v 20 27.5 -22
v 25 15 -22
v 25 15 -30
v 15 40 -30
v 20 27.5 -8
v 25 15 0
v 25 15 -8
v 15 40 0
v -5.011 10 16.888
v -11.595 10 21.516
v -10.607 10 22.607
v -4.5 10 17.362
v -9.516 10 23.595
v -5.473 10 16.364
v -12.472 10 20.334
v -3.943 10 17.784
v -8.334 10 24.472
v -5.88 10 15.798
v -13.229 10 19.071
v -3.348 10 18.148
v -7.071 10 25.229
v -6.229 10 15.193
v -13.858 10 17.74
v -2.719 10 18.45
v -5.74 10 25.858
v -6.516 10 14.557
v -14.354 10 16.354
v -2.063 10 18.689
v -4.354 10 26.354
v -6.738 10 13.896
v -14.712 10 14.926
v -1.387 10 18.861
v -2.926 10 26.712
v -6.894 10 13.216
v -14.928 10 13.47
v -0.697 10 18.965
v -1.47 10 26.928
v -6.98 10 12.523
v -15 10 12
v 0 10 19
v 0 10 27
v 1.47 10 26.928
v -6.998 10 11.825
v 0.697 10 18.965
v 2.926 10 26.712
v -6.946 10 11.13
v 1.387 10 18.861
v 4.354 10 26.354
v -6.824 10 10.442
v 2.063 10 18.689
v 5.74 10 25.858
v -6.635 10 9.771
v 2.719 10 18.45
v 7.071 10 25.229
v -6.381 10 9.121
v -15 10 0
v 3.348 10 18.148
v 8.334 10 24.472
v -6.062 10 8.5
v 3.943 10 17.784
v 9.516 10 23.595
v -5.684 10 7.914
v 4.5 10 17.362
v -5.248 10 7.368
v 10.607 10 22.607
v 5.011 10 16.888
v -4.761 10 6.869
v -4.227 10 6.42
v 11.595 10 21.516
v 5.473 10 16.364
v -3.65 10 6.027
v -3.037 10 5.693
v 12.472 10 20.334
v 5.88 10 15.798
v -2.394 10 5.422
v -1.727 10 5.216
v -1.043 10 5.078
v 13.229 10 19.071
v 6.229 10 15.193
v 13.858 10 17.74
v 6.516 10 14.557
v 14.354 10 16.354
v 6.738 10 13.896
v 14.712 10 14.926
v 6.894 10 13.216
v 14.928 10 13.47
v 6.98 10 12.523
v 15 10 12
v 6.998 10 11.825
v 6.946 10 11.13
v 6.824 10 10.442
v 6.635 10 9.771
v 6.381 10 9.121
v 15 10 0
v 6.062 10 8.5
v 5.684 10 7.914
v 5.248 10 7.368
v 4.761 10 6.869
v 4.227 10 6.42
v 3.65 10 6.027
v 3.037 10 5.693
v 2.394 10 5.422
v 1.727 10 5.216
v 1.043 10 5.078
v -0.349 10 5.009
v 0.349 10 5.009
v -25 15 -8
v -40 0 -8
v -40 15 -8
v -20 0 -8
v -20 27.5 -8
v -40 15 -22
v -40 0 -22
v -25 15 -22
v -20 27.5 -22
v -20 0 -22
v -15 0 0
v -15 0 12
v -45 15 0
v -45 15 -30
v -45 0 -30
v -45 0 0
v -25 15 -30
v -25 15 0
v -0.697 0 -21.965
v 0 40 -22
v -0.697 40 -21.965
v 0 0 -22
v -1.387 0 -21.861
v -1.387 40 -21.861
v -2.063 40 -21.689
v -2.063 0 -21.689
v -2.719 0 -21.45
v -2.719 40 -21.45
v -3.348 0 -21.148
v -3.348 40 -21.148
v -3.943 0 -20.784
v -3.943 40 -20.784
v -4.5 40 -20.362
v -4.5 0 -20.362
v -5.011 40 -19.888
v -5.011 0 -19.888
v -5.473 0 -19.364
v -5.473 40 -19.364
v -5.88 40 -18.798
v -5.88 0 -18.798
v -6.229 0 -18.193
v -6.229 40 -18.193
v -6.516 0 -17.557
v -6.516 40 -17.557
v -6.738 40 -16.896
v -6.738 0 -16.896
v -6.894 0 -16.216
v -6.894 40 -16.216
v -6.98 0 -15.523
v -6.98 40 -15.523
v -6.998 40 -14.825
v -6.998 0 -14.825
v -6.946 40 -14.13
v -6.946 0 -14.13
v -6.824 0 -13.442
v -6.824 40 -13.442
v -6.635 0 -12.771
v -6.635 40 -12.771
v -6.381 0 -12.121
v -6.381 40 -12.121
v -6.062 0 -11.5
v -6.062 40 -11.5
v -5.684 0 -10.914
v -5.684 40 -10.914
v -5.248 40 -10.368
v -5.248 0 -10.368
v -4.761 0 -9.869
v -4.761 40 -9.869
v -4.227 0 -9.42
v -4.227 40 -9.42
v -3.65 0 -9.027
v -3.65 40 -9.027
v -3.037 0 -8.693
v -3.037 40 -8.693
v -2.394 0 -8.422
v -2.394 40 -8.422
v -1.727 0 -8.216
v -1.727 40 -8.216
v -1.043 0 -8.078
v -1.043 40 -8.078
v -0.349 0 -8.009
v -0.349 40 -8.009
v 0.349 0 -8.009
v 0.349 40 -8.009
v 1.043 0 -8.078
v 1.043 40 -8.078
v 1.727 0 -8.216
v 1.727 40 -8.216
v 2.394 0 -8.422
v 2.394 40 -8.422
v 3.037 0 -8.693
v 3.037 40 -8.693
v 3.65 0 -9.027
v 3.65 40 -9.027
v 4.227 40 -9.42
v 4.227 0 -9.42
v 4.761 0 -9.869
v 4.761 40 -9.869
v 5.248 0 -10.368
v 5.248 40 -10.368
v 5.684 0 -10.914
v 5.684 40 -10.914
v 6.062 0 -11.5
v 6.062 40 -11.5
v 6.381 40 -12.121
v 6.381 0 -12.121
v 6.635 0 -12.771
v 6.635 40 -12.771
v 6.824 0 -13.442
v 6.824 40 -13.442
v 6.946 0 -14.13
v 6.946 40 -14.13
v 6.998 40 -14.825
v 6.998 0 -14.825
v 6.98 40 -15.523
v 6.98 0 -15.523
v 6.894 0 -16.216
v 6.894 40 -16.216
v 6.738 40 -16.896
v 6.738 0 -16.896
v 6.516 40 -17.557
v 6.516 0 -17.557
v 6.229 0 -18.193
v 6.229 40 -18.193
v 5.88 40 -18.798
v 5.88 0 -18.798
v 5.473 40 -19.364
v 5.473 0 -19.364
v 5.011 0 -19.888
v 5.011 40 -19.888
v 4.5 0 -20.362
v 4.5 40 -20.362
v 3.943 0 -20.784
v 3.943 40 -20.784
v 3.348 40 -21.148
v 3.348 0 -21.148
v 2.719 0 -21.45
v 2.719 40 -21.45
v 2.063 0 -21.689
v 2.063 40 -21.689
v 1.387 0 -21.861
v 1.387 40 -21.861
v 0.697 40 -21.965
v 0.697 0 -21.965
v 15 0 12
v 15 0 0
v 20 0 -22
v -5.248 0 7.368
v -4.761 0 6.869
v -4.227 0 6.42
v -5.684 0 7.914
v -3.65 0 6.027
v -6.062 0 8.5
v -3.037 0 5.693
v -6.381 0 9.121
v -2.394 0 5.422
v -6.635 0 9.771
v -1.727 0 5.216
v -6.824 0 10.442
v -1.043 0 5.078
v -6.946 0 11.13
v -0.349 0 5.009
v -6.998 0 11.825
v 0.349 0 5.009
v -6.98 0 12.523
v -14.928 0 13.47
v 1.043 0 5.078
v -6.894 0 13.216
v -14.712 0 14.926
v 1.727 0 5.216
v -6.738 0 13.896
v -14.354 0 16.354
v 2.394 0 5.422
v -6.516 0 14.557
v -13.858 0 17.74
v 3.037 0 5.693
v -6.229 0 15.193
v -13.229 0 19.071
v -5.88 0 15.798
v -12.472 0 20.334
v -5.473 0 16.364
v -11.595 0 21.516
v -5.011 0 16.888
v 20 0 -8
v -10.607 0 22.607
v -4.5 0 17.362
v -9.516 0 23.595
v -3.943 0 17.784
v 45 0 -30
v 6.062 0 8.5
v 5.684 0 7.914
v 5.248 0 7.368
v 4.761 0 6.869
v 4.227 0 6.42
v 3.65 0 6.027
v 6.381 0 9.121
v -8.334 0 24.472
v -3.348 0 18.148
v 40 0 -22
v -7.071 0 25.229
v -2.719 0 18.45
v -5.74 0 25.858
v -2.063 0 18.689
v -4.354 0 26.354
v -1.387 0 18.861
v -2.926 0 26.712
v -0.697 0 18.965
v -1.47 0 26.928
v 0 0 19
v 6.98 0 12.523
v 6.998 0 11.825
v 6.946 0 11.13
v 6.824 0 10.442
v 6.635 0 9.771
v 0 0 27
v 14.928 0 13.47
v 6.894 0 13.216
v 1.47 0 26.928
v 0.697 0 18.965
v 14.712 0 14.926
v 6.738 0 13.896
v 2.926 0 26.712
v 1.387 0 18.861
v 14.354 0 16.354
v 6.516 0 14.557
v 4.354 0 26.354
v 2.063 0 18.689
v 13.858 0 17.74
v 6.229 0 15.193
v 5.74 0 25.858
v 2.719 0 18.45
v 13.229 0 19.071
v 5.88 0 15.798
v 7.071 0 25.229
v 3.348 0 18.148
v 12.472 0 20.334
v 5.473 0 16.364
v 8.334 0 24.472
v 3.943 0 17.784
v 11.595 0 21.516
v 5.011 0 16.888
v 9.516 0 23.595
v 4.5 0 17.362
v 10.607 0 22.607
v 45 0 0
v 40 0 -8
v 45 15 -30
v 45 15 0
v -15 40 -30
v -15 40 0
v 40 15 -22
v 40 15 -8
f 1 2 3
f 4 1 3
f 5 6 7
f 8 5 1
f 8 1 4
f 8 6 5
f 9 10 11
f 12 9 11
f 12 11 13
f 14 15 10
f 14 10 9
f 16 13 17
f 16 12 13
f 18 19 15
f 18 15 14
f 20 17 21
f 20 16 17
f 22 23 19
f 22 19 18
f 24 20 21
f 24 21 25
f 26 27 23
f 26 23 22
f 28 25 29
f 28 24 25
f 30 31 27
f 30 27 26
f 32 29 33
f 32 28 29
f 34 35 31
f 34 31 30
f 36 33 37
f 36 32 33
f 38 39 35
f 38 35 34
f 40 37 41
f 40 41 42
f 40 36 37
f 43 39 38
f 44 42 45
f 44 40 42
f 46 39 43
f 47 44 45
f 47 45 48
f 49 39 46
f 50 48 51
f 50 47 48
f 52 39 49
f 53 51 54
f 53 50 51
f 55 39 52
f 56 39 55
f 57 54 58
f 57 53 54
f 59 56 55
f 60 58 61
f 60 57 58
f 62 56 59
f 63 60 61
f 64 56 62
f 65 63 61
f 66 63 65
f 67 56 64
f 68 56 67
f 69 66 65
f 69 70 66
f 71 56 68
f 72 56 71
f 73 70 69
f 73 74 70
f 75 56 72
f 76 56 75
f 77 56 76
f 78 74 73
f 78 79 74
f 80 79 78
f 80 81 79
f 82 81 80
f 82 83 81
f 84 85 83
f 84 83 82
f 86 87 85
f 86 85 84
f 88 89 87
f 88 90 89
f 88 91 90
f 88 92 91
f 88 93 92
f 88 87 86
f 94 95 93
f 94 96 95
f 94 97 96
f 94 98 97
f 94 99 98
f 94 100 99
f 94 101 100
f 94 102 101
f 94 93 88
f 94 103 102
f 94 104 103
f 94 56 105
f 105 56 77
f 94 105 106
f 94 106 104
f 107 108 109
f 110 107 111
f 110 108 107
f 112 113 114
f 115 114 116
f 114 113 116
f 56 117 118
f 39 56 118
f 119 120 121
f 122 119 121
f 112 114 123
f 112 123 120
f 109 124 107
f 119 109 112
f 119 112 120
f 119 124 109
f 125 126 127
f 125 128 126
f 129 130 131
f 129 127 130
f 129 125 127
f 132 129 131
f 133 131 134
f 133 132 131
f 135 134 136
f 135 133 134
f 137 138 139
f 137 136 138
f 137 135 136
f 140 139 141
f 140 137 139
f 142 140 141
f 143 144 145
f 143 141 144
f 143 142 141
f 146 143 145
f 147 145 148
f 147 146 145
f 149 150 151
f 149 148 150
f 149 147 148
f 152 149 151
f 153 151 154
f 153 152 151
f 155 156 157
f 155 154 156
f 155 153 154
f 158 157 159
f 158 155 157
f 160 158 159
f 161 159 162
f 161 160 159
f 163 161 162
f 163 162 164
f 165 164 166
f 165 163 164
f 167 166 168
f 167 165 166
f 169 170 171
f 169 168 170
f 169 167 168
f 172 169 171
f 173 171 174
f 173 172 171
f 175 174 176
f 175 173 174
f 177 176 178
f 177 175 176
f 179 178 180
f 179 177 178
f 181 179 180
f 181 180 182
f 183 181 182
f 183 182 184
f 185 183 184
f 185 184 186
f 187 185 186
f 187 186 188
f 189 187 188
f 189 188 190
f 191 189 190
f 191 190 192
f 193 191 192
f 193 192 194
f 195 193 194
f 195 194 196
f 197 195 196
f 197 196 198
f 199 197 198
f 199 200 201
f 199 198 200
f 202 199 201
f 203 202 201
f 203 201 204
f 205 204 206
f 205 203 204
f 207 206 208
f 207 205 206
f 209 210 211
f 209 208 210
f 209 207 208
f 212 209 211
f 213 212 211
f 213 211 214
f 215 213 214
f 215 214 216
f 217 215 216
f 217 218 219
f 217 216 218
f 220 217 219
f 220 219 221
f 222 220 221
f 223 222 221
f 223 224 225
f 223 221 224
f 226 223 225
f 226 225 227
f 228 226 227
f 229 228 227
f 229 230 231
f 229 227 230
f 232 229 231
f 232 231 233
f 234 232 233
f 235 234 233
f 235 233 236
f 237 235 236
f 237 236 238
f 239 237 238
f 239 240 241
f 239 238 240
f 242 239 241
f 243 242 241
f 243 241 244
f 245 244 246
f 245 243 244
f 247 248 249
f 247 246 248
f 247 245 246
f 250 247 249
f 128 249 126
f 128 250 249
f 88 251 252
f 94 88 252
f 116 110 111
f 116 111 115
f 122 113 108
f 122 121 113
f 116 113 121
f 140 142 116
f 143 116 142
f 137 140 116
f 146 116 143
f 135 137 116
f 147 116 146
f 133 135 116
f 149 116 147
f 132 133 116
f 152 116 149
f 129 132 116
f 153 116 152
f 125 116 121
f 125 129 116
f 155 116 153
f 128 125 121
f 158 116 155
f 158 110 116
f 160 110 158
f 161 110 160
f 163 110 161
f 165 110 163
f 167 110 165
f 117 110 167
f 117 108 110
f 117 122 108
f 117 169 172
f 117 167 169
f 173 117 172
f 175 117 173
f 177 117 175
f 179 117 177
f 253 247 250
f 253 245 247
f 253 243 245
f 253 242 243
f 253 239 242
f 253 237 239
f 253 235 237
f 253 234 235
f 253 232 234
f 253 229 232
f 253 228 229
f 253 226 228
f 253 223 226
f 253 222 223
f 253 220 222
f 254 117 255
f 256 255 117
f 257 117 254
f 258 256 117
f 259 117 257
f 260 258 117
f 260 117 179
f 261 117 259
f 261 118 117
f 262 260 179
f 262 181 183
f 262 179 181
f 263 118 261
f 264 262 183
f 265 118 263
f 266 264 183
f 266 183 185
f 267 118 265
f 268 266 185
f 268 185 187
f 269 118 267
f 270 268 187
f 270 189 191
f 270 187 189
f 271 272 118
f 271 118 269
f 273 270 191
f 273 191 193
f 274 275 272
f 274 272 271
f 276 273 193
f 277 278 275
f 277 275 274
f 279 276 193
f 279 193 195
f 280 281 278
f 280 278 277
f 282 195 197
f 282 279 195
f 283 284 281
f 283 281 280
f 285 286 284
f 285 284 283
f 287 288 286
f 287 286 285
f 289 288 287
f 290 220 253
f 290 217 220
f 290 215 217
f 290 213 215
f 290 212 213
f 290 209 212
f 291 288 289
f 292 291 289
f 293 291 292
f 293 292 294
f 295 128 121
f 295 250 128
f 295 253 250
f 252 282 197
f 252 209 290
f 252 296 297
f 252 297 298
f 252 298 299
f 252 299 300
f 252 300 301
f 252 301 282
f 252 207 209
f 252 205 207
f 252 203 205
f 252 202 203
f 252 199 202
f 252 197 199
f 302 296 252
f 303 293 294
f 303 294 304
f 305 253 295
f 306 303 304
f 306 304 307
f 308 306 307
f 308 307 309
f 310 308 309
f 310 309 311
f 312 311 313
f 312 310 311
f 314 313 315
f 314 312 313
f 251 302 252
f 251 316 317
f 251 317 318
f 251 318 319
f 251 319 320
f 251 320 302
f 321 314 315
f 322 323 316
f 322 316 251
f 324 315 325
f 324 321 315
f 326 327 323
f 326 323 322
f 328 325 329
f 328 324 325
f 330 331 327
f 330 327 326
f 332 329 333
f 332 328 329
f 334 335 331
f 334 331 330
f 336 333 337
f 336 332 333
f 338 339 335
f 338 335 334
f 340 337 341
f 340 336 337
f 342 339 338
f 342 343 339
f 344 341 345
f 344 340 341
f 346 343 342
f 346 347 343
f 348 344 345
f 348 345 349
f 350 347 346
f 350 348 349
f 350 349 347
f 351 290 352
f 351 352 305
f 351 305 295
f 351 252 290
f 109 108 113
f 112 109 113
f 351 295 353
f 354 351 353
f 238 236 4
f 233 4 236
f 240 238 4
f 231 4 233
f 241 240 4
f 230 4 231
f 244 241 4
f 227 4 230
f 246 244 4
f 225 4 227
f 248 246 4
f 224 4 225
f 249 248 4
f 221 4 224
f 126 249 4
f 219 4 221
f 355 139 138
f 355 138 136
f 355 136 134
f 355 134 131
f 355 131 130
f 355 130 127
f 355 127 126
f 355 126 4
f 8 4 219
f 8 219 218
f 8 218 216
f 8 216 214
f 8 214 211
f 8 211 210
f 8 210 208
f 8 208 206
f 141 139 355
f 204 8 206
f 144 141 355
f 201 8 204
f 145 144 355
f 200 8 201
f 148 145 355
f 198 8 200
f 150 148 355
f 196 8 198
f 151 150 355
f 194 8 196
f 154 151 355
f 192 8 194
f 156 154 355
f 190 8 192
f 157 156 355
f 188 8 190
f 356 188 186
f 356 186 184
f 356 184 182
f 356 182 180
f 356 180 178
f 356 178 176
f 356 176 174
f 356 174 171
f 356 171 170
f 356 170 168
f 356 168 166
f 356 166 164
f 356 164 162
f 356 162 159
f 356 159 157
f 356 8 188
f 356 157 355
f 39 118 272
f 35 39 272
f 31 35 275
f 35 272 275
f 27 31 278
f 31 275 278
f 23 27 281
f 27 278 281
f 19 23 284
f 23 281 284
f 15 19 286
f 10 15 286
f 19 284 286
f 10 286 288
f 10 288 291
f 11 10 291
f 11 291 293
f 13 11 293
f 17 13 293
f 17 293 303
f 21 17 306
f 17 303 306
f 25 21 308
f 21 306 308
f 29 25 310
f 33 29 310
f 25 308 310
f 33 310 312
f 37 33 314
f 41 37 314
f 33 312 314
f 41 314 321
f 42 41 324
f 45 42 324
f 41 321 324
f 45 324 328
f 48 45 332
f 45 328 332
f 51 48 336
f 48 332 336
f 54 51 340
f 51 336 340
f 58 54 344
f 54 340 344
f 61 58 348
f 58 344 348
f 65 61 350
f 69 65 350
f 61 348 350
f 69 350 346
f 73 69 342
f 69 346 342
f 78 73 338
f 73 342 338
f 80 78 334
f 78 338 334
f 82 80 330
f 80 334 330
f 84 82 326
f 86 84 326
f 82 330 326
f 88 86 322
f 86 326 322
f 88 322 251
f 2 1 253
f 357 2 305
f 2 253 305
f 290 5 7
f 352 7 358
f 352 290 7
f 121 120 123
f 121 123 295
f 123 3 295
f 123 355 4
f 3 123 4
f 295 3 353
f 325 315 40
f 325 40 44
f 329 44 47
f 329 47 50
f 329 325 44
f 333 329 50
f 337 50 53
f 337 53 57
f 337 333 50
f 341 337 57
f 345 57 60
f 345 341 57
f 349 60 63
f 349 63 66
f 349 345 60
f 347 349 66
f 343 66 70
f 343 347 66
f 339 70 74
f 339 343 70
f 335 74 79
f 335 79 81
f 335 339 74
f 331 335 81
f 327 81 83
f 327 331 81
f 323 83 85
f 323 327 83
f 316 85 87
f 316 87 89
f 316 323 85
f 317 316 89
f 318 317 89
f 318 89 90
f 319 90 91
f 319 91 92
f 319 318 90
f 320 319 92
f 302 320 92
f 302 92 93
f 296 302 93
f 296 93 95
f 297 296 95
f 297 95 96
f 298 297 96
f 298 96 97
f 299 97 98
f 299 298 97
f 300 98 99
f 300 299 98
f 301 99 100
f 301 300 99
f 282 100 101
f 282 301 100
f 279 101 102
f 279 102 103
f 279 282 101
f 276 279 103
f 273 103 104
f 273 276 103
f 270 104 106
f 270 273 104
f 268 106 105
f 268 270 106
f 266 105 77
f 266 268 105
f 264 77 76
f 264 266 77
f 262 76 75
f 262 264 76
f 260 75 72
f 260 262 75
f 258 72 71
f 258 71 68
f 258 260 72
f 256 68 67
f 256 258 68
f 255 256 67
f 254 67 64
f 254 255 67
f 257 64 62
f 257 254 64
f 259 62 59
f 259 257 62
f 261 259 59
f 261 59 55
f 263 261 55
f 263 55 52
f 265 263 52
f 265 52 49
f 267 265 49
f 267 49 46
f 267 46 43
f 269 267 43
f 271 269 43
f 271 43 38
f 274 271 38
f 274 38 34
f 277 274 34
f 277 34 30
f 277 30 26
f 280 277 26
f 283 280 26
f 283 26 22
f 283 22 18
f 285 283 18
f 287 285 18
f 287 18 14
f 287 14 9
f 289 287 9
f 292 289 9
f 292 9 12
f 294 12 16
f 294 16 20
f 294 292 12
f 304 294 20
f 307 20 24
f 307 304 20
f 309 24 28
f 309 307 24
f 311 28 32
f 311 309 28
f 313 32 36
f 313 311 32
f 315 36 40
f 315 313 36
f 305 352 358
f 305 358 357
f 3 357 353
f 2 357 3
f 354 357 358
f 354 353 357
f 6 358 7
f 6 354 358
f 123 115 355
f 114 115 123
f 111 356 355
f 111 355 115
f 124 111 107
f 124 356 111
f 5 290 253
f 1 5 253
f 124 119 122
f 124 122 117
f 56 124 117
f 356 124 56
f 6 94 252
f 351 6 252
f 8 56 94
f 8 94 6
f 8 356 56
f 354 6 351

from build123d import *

# Parameters (mm, degrees)
BOSS_EXTRUDE1_DEPTH     = 30
CUT_EXTRUDE1_DEPTH      = 68.268120235
CUT_EXTRUDE1_DEPTH_BACK = 68.268120235
SKETCH3_W               = 20
SKETCH3_H               = 14
CUT_EXTRUDE2_DEPTH      = 68.268120235
CUT_EXTRUDE2_DEPTH_BACK = 68.268120235
SKETCH4_R               = 7
SKETCH5_R               = 7
BOSS_EXTRUDE3_DEPTH     = 10


with BuildPart() as part:
    # Sketch2 → Boss-Extrude1 (new body)
    with BuildSketch(Plane.XY):
        Polygon((-45, 0), (45, 0), (45, 15), (25, 15), (15, 40), (-15, 40), (-25, 15), (-45, 15), align=None)
    extrude(amount=-BOSS_EXTRUDE1_DEPTH)

    # Sketch3 → Cut-Extrude1 (cut, two sides: drawn at the far end of the back side and taken through both)
    with BuildSketch(Plane(origin=(0, 0, 0), x_dir=(1, 0, 0), z_dir=(0, 1, 0)).offset(-CUT_EXTRUDE1_DEPTH_BACK)):
        with Locations((-30, 15)):
            Rectangle(SKETCH3_W, SKETCH3_H)
        with Locations((30, 15)):
            Rectangle(SKETCH3_W, SKETCH3_H)
    extrude(amount=CUT_EXTRUDE1_DEPTH + CUT_EXTRUDE1_DEPTH_BACK, mode=Mode.SUBTRACT)

    # Sketch4 → Cut-Extrude2 (cut, two sides: drawn at the far end of the back side and taken through both)
    with BuildSketch(Plane(origin=(0, 0, 0), x_dir=(1, 0, 0), z_dir=(0, 1, 0)).offset(-CUT_EXTRUDE2_DEPTH_BACK)):
        with Locations(Location((0, 15, 0), (0, 0, 90))):
            Circle(SKETCH4_R)
    extrude(amount=CUT_EXTRUDE2_DEPTH + CUT_EXTRUDE2_DEPTH_BACK, mode=Mode.SUBTRACT)

    # Sketch5 → Boss-Extrude3 (add)
    with BuildSketch(Plane(origin=(0, 0, 0), x_dir=(1, 0, 0), z_dir=(0, 1, 0))):
        with BuildLine():
            Line((-15, 0), (-15, -12))
            ThreePointArc((-15, -12), (0, -27), (15, -12))
            Line((15, -12), (15, 0))
            Line((15, 0), (-15, 0))
        make_face()
        with Locations(Location((0, -12, 0), (0, 0, 270))):
            Circle(SKETCH5_R, mode=Mode.SUBTRACT)
    extrude(amount=BOSS_EXTRUDE3_DEPTH)


solid = part.part
